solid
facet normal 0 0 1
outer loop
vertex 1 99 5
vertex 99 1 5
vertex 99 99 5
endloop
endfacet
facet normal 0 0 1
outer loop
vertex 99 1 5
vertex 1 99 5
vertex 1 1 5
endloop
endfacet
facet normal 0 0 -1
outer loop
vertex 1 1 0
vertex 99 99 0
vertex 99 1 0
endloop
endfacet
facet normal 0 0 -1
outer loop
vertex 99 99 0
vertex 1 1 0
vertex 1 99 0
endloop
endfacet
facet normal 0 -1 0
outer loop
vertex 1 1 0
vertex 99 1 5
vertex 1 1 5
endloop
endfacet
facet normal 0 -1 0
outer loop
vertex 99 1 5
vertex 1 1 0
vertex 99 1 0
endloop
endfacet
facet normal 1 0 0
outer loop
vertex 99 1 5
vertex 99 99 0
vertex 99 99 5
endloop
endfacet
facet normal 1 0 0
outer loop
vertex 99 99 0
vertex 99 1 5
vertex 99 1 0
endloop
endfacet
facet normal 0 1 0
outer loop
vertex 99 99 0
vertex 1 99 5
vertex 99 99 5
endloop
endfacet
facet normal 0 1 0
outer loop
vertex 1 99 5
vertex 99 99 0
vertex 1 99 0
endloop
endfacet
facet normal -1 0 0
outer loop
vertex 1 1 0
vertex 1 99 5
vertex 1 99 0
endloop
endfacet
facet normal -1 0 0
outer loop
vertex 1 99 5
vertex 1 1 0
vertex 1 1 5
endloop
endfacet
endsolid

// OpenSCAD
/*linear_extrude(height=5){
    square(100);
}
translate([0,0,5]){
    linear_extrude(height=5){
        !surface(file="/home/vagrant/openscad/images/qr.png", invert=false);
    }
}
*/

scale([2/7,2/7,0.1]){
    surface(file="/home/vagrant/openscad/images/qr.png", invert=false);
}
translate([1,1,0]){
    cube([98,98,5]);
}
